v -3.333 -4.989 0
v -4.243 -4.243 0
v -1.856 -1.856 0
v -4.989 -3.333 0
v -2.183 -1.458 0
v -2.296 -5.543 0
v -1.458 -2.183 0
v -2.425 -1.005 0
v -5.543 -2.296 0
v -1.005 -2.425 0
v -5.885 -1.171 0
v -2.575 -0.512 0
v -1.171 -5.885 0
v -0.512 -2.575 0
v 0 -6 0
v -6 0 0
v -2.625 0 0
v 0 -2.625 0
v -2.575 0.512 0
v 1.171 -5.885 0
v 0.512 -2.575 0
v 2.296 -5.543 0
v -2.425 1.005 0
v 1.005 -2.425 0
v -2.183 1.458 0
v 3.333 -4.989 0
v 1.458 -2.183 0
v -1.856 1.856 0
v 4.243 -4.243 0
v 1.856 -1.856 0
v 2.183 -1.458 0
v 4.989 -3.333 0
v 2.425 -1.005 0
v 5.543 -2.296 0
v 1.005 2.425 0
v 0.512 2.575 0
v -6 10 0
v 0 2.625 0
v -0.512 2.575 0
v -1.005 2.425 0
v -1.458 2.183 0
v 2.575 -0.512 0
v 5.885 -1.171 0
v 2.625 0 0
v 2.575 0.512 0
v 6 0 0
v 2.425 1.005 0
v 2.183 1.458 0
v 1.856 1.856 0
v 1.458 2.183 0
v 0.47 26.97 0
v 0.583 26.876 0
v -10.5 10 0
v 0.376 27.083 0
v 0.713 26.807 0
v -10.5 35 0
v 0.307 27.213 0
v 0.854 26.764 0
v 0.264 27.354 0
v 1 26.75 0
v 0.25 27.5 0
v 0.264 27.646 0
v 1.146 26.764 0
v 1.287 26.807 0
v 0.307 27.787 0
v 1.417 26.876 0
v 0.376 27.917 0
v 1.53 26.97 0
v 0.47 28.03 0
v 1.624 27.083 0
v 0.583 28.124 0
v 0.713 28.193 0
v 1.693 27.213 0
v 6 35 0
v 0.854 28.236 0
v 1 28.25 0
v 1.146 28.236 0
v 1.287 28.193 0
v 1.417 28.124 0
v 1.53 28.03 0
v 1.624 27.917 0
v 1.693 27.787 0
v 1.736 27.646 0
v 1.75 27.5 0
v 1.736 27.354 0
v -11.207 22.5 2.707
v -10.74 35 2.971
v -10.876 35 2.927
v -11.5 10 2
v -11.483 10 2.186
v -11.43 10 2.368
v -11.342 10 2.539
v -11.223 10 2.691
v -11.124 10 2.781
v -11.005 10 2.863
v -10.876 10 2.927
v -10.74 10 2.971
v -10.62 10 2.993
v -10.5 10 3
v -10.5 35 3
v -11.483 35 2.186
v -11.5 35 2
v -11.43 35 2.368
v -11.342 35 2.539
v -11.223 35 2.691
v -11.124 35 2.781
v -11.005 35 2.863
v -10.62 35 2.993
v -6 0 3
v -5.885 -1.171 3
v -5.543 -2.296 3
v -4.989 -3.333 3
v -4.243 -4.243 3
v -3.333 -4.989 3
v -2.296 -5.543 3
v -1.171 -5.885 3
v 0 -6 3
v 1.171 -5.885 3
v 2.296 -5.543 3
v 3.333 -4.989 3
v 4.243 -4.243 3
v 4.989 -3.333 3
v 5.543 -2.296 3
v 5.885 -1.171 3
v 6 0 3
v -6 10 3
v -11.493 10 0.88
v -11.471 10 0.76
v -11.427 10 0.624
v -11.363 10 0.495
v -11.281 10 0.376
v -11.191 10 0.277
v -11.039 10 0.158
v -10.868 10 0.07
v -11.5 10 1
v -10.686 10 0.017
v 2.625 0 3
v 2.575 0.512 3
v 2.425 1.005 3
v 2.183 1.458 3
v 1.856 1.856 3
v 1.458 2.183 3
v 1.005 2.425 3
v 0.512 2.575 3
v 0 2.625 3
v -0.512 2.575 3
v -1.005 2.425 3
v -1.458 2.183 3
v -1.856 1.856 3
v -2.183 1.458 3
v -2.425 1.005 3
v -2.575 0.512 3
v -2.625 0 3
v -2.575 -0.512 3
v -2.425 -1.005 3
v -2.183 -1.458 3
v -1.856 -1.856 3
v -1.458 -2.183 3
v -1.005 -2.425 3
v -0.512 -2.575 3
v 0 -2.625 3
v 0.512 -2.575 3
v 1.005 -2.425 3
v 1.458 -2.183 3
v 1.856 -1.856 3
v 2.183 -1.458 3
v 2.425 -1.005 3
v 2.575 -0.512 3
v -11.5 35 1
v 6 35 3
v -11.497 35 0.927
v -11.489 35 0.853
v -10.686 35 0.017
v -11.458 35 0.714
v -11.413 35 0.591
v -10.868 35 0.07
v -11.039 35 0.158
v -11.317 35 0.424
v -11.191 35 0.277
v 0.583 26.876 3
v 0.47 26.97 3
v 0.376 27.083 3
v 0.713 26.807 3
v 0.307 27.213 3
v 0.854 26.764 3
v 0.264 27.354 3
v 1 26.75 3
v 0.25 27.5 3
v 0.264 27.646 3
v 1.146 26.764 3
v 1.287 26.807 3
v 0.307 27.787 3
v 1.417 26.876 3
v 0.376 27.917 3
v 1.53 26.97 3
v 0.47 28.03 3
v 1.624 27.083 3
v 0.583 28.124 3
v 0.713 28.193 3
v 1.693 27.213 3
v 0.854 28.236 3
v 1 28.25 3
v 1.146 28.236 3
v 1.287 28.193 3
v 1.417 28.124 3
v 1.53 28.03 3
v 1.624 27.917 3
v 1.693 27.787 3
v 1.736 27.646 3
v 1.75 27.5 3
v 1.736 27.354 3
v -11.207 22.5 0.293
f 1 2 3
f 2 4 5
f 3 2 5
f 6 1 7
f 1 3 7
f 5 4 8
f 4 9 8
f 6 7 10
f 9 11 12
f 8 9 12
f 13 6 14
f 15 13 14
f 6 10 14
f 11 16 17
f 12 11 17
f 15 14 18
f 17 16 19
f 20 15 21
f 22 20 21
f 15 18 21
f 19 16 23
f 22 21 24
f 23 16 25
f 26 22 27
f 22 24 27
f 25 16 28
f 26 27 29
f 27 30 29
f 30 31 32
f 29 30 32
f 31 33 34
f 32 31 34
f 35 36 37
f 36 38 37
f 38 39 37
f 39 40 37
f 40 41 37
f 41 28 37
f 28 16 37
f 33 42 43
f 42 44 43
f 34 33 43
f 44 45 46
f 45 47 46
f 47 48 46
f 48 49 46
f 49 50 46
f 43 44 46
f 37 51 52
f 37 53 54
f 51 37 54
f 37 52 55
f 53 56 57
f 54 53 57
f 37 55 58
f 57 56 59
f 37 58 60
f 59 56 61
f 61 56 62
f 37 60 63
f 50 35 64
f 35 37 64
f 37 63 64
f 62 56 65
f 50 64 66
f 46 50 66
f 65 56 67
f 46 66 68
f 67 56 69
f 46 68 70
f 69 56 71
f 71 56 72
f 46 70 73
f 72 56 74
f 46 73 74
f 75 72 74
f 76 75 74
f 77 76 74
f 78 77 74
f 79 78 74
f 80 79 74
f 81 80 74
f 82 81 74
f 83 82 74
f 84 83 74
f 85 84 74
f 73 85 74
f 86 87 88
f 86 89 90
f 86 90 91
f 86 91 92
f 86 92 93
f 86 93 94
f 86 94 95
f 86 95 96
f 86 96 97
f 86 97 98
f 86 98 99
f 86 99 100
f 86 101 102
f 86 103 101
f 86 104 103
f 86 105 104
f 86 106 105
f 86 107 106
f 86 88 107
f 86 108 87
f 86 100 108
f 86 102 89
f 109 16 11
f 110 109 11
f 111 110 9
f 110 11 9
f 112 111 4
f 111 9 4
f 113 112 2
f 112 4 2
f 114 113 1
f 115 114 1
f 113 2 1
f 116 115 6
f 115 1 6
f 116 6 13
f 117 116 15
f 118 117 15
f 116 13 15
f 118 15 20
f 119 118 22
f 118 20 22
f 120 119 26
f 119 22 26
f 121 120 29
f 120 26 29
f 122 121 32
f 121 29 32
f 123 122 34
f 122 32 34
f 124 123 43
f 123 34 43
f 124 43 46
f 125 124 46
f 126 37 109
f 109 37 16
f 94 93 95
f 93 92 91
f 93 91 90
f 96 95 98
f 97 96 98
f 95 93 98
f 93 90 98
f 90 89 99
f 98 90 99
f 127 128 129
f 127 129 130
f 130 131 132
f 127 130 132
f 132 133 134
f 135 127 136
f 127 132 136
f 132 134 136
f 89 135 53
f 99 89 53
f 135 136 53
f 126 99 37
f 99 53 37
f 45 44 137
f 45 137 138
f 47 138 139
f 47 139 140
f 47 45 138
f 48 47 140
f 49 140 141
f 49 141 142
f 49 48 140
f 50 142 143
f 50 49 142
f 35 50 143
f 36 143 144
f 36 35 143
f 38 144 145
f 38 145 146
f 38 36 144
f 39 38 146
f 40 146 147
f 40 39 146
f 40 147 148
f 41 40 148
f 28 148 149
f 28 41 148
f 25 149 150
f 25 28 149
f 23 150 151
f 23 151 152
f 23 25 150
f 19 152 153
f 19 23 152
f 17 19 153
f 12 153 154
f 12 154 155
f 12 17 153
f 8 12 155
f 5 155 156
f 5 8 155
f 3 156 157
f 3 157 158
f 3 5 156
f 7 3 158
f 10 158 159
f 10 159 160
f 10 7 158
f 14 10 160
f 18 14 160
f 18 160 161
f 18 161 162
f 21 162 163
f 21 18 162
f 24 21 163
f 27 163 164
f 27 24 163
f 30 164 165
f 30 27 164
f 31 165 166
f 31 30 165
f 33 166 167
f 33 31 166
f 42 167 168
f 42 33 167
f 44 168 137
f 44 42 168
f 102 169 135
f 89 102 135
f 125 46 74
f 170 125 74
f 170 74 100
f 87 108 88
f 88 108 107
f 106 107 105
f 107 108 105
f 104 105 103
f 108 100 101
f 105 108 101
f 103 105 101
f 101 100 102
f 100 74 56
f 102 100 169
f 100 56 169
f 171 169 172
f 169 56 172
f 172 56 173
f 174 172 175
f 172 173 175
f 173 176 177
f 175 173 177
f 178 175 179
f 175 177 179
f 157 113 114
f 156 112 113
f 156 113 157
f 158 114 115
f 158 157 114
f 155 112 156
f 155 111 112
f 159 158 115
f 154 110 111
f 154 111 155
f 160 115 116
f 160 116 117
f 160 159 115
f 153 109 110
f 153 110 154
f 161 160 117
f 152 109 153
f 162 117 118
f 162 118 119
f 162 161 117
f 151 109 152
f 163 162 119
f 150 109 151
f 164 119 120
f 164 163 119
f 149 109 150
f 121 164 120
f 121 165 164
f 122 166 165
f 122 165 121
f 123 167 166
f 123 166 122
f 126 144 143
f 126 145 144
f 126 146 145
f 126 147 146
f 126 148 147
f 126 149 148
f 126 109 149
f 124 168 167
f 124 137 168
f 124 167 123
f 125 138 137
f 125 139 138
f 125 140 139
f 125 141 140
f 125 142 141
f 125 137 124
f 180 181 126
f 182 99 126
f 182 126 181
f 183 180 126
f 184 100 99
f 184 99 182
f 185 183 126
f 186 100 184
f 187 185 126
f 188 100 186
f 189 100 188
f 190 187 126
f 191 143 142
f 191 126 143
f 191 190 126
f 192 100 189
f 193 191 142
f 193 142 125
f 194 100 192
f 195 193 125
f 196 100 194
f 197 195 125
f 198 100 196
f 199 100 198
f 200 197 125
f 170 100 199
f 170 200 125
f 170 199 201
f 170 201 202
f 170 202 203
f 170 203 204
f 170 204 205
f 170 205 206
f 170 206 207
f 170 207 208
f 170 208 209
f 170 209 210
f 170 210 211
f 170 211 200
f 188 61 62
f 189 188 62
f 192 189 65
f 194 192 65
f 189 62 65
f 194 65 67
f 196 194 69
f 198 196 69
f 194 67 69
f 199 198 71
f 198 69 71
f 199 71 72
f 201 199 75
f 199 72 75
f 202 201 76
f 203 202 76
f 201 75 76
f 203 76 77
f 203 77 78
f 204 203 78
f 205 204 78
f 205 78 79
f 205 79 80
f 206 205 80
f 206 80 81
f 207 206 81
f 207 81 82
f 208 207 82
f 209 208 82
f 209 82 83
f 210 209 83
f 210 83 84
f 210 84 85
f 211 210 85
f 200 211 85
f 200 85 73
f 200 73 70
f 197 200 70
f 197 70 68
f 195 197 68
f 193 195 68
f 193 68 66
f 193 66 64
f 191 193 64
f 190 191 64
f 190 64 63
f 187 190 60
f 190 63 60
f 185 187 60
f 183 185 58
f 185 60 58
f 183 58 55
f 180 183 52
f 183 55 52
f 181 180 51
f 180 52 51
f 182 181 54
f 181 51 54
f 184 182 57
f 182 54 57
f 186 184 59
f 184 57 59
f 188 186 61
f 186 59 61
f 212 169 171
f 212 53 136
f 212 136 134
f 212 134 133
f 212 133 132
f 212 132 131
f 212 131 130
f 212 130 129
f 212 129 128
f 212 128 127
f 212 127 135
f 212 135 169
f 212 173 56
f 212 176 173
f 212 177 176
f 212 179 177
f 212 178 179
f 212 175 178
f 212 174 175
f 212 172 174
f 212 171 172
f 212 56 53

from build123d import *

# Parameters (mm, degrees)
SKETCH1_R           = 2.625
BOSS_EXTRUDE1_DEPTH = 3
VARFILLET1_R        = 1
SKETCH3_R           = 0.75
CUT_EXTRUDE1_DEPTH  = 10


with BuildPart() as part:
    # Sketch1 → Boss-Extrude1 (new body)
    with BuildSketch(Plane.XY):
        with BuildLine():
            Line((-6, 10), (-6, 0))
            ThreePointArc((-6, 0), (0, -6), (6, 0))
            Line((6, 0), (6, 35))
            Line((6, 35), (-11.5, 35))
            Line((-11.5, 35), (-11.5, 10))
            Line((-11.5, 10), (-6, 10))
        make_face()
        Circle(SKETCH1_R, mode=Mode.SUBTRACT)
    extrude(amount=BOSS_EXTRUDE1_DEPTH)

    # VarFillet1
    varfillet1_edges = [part.edges().sort_by_distance(p)[0] for p in [
        (-11.5, 22.5, 0),
        (-11.5, 22.5, 3),
    ]]
    fillet(varfillet1_edges, radius=VARFILLET1_R)

    # Sketch3 → Cut-Extrude1 (cut)
    with BuildSketch(Plane(origin=(0, 0, 0), x_dir=(-1, 0, 0), z_dir=(0, 0, -1))):
        with Locations((-1, 27.5)):
            Circle(SKETCH3_R)
    extrude(amount=-CUT_EXTRUDE1_DEPTH, mode=Mode.SUBTRACT)


solid = part.part
